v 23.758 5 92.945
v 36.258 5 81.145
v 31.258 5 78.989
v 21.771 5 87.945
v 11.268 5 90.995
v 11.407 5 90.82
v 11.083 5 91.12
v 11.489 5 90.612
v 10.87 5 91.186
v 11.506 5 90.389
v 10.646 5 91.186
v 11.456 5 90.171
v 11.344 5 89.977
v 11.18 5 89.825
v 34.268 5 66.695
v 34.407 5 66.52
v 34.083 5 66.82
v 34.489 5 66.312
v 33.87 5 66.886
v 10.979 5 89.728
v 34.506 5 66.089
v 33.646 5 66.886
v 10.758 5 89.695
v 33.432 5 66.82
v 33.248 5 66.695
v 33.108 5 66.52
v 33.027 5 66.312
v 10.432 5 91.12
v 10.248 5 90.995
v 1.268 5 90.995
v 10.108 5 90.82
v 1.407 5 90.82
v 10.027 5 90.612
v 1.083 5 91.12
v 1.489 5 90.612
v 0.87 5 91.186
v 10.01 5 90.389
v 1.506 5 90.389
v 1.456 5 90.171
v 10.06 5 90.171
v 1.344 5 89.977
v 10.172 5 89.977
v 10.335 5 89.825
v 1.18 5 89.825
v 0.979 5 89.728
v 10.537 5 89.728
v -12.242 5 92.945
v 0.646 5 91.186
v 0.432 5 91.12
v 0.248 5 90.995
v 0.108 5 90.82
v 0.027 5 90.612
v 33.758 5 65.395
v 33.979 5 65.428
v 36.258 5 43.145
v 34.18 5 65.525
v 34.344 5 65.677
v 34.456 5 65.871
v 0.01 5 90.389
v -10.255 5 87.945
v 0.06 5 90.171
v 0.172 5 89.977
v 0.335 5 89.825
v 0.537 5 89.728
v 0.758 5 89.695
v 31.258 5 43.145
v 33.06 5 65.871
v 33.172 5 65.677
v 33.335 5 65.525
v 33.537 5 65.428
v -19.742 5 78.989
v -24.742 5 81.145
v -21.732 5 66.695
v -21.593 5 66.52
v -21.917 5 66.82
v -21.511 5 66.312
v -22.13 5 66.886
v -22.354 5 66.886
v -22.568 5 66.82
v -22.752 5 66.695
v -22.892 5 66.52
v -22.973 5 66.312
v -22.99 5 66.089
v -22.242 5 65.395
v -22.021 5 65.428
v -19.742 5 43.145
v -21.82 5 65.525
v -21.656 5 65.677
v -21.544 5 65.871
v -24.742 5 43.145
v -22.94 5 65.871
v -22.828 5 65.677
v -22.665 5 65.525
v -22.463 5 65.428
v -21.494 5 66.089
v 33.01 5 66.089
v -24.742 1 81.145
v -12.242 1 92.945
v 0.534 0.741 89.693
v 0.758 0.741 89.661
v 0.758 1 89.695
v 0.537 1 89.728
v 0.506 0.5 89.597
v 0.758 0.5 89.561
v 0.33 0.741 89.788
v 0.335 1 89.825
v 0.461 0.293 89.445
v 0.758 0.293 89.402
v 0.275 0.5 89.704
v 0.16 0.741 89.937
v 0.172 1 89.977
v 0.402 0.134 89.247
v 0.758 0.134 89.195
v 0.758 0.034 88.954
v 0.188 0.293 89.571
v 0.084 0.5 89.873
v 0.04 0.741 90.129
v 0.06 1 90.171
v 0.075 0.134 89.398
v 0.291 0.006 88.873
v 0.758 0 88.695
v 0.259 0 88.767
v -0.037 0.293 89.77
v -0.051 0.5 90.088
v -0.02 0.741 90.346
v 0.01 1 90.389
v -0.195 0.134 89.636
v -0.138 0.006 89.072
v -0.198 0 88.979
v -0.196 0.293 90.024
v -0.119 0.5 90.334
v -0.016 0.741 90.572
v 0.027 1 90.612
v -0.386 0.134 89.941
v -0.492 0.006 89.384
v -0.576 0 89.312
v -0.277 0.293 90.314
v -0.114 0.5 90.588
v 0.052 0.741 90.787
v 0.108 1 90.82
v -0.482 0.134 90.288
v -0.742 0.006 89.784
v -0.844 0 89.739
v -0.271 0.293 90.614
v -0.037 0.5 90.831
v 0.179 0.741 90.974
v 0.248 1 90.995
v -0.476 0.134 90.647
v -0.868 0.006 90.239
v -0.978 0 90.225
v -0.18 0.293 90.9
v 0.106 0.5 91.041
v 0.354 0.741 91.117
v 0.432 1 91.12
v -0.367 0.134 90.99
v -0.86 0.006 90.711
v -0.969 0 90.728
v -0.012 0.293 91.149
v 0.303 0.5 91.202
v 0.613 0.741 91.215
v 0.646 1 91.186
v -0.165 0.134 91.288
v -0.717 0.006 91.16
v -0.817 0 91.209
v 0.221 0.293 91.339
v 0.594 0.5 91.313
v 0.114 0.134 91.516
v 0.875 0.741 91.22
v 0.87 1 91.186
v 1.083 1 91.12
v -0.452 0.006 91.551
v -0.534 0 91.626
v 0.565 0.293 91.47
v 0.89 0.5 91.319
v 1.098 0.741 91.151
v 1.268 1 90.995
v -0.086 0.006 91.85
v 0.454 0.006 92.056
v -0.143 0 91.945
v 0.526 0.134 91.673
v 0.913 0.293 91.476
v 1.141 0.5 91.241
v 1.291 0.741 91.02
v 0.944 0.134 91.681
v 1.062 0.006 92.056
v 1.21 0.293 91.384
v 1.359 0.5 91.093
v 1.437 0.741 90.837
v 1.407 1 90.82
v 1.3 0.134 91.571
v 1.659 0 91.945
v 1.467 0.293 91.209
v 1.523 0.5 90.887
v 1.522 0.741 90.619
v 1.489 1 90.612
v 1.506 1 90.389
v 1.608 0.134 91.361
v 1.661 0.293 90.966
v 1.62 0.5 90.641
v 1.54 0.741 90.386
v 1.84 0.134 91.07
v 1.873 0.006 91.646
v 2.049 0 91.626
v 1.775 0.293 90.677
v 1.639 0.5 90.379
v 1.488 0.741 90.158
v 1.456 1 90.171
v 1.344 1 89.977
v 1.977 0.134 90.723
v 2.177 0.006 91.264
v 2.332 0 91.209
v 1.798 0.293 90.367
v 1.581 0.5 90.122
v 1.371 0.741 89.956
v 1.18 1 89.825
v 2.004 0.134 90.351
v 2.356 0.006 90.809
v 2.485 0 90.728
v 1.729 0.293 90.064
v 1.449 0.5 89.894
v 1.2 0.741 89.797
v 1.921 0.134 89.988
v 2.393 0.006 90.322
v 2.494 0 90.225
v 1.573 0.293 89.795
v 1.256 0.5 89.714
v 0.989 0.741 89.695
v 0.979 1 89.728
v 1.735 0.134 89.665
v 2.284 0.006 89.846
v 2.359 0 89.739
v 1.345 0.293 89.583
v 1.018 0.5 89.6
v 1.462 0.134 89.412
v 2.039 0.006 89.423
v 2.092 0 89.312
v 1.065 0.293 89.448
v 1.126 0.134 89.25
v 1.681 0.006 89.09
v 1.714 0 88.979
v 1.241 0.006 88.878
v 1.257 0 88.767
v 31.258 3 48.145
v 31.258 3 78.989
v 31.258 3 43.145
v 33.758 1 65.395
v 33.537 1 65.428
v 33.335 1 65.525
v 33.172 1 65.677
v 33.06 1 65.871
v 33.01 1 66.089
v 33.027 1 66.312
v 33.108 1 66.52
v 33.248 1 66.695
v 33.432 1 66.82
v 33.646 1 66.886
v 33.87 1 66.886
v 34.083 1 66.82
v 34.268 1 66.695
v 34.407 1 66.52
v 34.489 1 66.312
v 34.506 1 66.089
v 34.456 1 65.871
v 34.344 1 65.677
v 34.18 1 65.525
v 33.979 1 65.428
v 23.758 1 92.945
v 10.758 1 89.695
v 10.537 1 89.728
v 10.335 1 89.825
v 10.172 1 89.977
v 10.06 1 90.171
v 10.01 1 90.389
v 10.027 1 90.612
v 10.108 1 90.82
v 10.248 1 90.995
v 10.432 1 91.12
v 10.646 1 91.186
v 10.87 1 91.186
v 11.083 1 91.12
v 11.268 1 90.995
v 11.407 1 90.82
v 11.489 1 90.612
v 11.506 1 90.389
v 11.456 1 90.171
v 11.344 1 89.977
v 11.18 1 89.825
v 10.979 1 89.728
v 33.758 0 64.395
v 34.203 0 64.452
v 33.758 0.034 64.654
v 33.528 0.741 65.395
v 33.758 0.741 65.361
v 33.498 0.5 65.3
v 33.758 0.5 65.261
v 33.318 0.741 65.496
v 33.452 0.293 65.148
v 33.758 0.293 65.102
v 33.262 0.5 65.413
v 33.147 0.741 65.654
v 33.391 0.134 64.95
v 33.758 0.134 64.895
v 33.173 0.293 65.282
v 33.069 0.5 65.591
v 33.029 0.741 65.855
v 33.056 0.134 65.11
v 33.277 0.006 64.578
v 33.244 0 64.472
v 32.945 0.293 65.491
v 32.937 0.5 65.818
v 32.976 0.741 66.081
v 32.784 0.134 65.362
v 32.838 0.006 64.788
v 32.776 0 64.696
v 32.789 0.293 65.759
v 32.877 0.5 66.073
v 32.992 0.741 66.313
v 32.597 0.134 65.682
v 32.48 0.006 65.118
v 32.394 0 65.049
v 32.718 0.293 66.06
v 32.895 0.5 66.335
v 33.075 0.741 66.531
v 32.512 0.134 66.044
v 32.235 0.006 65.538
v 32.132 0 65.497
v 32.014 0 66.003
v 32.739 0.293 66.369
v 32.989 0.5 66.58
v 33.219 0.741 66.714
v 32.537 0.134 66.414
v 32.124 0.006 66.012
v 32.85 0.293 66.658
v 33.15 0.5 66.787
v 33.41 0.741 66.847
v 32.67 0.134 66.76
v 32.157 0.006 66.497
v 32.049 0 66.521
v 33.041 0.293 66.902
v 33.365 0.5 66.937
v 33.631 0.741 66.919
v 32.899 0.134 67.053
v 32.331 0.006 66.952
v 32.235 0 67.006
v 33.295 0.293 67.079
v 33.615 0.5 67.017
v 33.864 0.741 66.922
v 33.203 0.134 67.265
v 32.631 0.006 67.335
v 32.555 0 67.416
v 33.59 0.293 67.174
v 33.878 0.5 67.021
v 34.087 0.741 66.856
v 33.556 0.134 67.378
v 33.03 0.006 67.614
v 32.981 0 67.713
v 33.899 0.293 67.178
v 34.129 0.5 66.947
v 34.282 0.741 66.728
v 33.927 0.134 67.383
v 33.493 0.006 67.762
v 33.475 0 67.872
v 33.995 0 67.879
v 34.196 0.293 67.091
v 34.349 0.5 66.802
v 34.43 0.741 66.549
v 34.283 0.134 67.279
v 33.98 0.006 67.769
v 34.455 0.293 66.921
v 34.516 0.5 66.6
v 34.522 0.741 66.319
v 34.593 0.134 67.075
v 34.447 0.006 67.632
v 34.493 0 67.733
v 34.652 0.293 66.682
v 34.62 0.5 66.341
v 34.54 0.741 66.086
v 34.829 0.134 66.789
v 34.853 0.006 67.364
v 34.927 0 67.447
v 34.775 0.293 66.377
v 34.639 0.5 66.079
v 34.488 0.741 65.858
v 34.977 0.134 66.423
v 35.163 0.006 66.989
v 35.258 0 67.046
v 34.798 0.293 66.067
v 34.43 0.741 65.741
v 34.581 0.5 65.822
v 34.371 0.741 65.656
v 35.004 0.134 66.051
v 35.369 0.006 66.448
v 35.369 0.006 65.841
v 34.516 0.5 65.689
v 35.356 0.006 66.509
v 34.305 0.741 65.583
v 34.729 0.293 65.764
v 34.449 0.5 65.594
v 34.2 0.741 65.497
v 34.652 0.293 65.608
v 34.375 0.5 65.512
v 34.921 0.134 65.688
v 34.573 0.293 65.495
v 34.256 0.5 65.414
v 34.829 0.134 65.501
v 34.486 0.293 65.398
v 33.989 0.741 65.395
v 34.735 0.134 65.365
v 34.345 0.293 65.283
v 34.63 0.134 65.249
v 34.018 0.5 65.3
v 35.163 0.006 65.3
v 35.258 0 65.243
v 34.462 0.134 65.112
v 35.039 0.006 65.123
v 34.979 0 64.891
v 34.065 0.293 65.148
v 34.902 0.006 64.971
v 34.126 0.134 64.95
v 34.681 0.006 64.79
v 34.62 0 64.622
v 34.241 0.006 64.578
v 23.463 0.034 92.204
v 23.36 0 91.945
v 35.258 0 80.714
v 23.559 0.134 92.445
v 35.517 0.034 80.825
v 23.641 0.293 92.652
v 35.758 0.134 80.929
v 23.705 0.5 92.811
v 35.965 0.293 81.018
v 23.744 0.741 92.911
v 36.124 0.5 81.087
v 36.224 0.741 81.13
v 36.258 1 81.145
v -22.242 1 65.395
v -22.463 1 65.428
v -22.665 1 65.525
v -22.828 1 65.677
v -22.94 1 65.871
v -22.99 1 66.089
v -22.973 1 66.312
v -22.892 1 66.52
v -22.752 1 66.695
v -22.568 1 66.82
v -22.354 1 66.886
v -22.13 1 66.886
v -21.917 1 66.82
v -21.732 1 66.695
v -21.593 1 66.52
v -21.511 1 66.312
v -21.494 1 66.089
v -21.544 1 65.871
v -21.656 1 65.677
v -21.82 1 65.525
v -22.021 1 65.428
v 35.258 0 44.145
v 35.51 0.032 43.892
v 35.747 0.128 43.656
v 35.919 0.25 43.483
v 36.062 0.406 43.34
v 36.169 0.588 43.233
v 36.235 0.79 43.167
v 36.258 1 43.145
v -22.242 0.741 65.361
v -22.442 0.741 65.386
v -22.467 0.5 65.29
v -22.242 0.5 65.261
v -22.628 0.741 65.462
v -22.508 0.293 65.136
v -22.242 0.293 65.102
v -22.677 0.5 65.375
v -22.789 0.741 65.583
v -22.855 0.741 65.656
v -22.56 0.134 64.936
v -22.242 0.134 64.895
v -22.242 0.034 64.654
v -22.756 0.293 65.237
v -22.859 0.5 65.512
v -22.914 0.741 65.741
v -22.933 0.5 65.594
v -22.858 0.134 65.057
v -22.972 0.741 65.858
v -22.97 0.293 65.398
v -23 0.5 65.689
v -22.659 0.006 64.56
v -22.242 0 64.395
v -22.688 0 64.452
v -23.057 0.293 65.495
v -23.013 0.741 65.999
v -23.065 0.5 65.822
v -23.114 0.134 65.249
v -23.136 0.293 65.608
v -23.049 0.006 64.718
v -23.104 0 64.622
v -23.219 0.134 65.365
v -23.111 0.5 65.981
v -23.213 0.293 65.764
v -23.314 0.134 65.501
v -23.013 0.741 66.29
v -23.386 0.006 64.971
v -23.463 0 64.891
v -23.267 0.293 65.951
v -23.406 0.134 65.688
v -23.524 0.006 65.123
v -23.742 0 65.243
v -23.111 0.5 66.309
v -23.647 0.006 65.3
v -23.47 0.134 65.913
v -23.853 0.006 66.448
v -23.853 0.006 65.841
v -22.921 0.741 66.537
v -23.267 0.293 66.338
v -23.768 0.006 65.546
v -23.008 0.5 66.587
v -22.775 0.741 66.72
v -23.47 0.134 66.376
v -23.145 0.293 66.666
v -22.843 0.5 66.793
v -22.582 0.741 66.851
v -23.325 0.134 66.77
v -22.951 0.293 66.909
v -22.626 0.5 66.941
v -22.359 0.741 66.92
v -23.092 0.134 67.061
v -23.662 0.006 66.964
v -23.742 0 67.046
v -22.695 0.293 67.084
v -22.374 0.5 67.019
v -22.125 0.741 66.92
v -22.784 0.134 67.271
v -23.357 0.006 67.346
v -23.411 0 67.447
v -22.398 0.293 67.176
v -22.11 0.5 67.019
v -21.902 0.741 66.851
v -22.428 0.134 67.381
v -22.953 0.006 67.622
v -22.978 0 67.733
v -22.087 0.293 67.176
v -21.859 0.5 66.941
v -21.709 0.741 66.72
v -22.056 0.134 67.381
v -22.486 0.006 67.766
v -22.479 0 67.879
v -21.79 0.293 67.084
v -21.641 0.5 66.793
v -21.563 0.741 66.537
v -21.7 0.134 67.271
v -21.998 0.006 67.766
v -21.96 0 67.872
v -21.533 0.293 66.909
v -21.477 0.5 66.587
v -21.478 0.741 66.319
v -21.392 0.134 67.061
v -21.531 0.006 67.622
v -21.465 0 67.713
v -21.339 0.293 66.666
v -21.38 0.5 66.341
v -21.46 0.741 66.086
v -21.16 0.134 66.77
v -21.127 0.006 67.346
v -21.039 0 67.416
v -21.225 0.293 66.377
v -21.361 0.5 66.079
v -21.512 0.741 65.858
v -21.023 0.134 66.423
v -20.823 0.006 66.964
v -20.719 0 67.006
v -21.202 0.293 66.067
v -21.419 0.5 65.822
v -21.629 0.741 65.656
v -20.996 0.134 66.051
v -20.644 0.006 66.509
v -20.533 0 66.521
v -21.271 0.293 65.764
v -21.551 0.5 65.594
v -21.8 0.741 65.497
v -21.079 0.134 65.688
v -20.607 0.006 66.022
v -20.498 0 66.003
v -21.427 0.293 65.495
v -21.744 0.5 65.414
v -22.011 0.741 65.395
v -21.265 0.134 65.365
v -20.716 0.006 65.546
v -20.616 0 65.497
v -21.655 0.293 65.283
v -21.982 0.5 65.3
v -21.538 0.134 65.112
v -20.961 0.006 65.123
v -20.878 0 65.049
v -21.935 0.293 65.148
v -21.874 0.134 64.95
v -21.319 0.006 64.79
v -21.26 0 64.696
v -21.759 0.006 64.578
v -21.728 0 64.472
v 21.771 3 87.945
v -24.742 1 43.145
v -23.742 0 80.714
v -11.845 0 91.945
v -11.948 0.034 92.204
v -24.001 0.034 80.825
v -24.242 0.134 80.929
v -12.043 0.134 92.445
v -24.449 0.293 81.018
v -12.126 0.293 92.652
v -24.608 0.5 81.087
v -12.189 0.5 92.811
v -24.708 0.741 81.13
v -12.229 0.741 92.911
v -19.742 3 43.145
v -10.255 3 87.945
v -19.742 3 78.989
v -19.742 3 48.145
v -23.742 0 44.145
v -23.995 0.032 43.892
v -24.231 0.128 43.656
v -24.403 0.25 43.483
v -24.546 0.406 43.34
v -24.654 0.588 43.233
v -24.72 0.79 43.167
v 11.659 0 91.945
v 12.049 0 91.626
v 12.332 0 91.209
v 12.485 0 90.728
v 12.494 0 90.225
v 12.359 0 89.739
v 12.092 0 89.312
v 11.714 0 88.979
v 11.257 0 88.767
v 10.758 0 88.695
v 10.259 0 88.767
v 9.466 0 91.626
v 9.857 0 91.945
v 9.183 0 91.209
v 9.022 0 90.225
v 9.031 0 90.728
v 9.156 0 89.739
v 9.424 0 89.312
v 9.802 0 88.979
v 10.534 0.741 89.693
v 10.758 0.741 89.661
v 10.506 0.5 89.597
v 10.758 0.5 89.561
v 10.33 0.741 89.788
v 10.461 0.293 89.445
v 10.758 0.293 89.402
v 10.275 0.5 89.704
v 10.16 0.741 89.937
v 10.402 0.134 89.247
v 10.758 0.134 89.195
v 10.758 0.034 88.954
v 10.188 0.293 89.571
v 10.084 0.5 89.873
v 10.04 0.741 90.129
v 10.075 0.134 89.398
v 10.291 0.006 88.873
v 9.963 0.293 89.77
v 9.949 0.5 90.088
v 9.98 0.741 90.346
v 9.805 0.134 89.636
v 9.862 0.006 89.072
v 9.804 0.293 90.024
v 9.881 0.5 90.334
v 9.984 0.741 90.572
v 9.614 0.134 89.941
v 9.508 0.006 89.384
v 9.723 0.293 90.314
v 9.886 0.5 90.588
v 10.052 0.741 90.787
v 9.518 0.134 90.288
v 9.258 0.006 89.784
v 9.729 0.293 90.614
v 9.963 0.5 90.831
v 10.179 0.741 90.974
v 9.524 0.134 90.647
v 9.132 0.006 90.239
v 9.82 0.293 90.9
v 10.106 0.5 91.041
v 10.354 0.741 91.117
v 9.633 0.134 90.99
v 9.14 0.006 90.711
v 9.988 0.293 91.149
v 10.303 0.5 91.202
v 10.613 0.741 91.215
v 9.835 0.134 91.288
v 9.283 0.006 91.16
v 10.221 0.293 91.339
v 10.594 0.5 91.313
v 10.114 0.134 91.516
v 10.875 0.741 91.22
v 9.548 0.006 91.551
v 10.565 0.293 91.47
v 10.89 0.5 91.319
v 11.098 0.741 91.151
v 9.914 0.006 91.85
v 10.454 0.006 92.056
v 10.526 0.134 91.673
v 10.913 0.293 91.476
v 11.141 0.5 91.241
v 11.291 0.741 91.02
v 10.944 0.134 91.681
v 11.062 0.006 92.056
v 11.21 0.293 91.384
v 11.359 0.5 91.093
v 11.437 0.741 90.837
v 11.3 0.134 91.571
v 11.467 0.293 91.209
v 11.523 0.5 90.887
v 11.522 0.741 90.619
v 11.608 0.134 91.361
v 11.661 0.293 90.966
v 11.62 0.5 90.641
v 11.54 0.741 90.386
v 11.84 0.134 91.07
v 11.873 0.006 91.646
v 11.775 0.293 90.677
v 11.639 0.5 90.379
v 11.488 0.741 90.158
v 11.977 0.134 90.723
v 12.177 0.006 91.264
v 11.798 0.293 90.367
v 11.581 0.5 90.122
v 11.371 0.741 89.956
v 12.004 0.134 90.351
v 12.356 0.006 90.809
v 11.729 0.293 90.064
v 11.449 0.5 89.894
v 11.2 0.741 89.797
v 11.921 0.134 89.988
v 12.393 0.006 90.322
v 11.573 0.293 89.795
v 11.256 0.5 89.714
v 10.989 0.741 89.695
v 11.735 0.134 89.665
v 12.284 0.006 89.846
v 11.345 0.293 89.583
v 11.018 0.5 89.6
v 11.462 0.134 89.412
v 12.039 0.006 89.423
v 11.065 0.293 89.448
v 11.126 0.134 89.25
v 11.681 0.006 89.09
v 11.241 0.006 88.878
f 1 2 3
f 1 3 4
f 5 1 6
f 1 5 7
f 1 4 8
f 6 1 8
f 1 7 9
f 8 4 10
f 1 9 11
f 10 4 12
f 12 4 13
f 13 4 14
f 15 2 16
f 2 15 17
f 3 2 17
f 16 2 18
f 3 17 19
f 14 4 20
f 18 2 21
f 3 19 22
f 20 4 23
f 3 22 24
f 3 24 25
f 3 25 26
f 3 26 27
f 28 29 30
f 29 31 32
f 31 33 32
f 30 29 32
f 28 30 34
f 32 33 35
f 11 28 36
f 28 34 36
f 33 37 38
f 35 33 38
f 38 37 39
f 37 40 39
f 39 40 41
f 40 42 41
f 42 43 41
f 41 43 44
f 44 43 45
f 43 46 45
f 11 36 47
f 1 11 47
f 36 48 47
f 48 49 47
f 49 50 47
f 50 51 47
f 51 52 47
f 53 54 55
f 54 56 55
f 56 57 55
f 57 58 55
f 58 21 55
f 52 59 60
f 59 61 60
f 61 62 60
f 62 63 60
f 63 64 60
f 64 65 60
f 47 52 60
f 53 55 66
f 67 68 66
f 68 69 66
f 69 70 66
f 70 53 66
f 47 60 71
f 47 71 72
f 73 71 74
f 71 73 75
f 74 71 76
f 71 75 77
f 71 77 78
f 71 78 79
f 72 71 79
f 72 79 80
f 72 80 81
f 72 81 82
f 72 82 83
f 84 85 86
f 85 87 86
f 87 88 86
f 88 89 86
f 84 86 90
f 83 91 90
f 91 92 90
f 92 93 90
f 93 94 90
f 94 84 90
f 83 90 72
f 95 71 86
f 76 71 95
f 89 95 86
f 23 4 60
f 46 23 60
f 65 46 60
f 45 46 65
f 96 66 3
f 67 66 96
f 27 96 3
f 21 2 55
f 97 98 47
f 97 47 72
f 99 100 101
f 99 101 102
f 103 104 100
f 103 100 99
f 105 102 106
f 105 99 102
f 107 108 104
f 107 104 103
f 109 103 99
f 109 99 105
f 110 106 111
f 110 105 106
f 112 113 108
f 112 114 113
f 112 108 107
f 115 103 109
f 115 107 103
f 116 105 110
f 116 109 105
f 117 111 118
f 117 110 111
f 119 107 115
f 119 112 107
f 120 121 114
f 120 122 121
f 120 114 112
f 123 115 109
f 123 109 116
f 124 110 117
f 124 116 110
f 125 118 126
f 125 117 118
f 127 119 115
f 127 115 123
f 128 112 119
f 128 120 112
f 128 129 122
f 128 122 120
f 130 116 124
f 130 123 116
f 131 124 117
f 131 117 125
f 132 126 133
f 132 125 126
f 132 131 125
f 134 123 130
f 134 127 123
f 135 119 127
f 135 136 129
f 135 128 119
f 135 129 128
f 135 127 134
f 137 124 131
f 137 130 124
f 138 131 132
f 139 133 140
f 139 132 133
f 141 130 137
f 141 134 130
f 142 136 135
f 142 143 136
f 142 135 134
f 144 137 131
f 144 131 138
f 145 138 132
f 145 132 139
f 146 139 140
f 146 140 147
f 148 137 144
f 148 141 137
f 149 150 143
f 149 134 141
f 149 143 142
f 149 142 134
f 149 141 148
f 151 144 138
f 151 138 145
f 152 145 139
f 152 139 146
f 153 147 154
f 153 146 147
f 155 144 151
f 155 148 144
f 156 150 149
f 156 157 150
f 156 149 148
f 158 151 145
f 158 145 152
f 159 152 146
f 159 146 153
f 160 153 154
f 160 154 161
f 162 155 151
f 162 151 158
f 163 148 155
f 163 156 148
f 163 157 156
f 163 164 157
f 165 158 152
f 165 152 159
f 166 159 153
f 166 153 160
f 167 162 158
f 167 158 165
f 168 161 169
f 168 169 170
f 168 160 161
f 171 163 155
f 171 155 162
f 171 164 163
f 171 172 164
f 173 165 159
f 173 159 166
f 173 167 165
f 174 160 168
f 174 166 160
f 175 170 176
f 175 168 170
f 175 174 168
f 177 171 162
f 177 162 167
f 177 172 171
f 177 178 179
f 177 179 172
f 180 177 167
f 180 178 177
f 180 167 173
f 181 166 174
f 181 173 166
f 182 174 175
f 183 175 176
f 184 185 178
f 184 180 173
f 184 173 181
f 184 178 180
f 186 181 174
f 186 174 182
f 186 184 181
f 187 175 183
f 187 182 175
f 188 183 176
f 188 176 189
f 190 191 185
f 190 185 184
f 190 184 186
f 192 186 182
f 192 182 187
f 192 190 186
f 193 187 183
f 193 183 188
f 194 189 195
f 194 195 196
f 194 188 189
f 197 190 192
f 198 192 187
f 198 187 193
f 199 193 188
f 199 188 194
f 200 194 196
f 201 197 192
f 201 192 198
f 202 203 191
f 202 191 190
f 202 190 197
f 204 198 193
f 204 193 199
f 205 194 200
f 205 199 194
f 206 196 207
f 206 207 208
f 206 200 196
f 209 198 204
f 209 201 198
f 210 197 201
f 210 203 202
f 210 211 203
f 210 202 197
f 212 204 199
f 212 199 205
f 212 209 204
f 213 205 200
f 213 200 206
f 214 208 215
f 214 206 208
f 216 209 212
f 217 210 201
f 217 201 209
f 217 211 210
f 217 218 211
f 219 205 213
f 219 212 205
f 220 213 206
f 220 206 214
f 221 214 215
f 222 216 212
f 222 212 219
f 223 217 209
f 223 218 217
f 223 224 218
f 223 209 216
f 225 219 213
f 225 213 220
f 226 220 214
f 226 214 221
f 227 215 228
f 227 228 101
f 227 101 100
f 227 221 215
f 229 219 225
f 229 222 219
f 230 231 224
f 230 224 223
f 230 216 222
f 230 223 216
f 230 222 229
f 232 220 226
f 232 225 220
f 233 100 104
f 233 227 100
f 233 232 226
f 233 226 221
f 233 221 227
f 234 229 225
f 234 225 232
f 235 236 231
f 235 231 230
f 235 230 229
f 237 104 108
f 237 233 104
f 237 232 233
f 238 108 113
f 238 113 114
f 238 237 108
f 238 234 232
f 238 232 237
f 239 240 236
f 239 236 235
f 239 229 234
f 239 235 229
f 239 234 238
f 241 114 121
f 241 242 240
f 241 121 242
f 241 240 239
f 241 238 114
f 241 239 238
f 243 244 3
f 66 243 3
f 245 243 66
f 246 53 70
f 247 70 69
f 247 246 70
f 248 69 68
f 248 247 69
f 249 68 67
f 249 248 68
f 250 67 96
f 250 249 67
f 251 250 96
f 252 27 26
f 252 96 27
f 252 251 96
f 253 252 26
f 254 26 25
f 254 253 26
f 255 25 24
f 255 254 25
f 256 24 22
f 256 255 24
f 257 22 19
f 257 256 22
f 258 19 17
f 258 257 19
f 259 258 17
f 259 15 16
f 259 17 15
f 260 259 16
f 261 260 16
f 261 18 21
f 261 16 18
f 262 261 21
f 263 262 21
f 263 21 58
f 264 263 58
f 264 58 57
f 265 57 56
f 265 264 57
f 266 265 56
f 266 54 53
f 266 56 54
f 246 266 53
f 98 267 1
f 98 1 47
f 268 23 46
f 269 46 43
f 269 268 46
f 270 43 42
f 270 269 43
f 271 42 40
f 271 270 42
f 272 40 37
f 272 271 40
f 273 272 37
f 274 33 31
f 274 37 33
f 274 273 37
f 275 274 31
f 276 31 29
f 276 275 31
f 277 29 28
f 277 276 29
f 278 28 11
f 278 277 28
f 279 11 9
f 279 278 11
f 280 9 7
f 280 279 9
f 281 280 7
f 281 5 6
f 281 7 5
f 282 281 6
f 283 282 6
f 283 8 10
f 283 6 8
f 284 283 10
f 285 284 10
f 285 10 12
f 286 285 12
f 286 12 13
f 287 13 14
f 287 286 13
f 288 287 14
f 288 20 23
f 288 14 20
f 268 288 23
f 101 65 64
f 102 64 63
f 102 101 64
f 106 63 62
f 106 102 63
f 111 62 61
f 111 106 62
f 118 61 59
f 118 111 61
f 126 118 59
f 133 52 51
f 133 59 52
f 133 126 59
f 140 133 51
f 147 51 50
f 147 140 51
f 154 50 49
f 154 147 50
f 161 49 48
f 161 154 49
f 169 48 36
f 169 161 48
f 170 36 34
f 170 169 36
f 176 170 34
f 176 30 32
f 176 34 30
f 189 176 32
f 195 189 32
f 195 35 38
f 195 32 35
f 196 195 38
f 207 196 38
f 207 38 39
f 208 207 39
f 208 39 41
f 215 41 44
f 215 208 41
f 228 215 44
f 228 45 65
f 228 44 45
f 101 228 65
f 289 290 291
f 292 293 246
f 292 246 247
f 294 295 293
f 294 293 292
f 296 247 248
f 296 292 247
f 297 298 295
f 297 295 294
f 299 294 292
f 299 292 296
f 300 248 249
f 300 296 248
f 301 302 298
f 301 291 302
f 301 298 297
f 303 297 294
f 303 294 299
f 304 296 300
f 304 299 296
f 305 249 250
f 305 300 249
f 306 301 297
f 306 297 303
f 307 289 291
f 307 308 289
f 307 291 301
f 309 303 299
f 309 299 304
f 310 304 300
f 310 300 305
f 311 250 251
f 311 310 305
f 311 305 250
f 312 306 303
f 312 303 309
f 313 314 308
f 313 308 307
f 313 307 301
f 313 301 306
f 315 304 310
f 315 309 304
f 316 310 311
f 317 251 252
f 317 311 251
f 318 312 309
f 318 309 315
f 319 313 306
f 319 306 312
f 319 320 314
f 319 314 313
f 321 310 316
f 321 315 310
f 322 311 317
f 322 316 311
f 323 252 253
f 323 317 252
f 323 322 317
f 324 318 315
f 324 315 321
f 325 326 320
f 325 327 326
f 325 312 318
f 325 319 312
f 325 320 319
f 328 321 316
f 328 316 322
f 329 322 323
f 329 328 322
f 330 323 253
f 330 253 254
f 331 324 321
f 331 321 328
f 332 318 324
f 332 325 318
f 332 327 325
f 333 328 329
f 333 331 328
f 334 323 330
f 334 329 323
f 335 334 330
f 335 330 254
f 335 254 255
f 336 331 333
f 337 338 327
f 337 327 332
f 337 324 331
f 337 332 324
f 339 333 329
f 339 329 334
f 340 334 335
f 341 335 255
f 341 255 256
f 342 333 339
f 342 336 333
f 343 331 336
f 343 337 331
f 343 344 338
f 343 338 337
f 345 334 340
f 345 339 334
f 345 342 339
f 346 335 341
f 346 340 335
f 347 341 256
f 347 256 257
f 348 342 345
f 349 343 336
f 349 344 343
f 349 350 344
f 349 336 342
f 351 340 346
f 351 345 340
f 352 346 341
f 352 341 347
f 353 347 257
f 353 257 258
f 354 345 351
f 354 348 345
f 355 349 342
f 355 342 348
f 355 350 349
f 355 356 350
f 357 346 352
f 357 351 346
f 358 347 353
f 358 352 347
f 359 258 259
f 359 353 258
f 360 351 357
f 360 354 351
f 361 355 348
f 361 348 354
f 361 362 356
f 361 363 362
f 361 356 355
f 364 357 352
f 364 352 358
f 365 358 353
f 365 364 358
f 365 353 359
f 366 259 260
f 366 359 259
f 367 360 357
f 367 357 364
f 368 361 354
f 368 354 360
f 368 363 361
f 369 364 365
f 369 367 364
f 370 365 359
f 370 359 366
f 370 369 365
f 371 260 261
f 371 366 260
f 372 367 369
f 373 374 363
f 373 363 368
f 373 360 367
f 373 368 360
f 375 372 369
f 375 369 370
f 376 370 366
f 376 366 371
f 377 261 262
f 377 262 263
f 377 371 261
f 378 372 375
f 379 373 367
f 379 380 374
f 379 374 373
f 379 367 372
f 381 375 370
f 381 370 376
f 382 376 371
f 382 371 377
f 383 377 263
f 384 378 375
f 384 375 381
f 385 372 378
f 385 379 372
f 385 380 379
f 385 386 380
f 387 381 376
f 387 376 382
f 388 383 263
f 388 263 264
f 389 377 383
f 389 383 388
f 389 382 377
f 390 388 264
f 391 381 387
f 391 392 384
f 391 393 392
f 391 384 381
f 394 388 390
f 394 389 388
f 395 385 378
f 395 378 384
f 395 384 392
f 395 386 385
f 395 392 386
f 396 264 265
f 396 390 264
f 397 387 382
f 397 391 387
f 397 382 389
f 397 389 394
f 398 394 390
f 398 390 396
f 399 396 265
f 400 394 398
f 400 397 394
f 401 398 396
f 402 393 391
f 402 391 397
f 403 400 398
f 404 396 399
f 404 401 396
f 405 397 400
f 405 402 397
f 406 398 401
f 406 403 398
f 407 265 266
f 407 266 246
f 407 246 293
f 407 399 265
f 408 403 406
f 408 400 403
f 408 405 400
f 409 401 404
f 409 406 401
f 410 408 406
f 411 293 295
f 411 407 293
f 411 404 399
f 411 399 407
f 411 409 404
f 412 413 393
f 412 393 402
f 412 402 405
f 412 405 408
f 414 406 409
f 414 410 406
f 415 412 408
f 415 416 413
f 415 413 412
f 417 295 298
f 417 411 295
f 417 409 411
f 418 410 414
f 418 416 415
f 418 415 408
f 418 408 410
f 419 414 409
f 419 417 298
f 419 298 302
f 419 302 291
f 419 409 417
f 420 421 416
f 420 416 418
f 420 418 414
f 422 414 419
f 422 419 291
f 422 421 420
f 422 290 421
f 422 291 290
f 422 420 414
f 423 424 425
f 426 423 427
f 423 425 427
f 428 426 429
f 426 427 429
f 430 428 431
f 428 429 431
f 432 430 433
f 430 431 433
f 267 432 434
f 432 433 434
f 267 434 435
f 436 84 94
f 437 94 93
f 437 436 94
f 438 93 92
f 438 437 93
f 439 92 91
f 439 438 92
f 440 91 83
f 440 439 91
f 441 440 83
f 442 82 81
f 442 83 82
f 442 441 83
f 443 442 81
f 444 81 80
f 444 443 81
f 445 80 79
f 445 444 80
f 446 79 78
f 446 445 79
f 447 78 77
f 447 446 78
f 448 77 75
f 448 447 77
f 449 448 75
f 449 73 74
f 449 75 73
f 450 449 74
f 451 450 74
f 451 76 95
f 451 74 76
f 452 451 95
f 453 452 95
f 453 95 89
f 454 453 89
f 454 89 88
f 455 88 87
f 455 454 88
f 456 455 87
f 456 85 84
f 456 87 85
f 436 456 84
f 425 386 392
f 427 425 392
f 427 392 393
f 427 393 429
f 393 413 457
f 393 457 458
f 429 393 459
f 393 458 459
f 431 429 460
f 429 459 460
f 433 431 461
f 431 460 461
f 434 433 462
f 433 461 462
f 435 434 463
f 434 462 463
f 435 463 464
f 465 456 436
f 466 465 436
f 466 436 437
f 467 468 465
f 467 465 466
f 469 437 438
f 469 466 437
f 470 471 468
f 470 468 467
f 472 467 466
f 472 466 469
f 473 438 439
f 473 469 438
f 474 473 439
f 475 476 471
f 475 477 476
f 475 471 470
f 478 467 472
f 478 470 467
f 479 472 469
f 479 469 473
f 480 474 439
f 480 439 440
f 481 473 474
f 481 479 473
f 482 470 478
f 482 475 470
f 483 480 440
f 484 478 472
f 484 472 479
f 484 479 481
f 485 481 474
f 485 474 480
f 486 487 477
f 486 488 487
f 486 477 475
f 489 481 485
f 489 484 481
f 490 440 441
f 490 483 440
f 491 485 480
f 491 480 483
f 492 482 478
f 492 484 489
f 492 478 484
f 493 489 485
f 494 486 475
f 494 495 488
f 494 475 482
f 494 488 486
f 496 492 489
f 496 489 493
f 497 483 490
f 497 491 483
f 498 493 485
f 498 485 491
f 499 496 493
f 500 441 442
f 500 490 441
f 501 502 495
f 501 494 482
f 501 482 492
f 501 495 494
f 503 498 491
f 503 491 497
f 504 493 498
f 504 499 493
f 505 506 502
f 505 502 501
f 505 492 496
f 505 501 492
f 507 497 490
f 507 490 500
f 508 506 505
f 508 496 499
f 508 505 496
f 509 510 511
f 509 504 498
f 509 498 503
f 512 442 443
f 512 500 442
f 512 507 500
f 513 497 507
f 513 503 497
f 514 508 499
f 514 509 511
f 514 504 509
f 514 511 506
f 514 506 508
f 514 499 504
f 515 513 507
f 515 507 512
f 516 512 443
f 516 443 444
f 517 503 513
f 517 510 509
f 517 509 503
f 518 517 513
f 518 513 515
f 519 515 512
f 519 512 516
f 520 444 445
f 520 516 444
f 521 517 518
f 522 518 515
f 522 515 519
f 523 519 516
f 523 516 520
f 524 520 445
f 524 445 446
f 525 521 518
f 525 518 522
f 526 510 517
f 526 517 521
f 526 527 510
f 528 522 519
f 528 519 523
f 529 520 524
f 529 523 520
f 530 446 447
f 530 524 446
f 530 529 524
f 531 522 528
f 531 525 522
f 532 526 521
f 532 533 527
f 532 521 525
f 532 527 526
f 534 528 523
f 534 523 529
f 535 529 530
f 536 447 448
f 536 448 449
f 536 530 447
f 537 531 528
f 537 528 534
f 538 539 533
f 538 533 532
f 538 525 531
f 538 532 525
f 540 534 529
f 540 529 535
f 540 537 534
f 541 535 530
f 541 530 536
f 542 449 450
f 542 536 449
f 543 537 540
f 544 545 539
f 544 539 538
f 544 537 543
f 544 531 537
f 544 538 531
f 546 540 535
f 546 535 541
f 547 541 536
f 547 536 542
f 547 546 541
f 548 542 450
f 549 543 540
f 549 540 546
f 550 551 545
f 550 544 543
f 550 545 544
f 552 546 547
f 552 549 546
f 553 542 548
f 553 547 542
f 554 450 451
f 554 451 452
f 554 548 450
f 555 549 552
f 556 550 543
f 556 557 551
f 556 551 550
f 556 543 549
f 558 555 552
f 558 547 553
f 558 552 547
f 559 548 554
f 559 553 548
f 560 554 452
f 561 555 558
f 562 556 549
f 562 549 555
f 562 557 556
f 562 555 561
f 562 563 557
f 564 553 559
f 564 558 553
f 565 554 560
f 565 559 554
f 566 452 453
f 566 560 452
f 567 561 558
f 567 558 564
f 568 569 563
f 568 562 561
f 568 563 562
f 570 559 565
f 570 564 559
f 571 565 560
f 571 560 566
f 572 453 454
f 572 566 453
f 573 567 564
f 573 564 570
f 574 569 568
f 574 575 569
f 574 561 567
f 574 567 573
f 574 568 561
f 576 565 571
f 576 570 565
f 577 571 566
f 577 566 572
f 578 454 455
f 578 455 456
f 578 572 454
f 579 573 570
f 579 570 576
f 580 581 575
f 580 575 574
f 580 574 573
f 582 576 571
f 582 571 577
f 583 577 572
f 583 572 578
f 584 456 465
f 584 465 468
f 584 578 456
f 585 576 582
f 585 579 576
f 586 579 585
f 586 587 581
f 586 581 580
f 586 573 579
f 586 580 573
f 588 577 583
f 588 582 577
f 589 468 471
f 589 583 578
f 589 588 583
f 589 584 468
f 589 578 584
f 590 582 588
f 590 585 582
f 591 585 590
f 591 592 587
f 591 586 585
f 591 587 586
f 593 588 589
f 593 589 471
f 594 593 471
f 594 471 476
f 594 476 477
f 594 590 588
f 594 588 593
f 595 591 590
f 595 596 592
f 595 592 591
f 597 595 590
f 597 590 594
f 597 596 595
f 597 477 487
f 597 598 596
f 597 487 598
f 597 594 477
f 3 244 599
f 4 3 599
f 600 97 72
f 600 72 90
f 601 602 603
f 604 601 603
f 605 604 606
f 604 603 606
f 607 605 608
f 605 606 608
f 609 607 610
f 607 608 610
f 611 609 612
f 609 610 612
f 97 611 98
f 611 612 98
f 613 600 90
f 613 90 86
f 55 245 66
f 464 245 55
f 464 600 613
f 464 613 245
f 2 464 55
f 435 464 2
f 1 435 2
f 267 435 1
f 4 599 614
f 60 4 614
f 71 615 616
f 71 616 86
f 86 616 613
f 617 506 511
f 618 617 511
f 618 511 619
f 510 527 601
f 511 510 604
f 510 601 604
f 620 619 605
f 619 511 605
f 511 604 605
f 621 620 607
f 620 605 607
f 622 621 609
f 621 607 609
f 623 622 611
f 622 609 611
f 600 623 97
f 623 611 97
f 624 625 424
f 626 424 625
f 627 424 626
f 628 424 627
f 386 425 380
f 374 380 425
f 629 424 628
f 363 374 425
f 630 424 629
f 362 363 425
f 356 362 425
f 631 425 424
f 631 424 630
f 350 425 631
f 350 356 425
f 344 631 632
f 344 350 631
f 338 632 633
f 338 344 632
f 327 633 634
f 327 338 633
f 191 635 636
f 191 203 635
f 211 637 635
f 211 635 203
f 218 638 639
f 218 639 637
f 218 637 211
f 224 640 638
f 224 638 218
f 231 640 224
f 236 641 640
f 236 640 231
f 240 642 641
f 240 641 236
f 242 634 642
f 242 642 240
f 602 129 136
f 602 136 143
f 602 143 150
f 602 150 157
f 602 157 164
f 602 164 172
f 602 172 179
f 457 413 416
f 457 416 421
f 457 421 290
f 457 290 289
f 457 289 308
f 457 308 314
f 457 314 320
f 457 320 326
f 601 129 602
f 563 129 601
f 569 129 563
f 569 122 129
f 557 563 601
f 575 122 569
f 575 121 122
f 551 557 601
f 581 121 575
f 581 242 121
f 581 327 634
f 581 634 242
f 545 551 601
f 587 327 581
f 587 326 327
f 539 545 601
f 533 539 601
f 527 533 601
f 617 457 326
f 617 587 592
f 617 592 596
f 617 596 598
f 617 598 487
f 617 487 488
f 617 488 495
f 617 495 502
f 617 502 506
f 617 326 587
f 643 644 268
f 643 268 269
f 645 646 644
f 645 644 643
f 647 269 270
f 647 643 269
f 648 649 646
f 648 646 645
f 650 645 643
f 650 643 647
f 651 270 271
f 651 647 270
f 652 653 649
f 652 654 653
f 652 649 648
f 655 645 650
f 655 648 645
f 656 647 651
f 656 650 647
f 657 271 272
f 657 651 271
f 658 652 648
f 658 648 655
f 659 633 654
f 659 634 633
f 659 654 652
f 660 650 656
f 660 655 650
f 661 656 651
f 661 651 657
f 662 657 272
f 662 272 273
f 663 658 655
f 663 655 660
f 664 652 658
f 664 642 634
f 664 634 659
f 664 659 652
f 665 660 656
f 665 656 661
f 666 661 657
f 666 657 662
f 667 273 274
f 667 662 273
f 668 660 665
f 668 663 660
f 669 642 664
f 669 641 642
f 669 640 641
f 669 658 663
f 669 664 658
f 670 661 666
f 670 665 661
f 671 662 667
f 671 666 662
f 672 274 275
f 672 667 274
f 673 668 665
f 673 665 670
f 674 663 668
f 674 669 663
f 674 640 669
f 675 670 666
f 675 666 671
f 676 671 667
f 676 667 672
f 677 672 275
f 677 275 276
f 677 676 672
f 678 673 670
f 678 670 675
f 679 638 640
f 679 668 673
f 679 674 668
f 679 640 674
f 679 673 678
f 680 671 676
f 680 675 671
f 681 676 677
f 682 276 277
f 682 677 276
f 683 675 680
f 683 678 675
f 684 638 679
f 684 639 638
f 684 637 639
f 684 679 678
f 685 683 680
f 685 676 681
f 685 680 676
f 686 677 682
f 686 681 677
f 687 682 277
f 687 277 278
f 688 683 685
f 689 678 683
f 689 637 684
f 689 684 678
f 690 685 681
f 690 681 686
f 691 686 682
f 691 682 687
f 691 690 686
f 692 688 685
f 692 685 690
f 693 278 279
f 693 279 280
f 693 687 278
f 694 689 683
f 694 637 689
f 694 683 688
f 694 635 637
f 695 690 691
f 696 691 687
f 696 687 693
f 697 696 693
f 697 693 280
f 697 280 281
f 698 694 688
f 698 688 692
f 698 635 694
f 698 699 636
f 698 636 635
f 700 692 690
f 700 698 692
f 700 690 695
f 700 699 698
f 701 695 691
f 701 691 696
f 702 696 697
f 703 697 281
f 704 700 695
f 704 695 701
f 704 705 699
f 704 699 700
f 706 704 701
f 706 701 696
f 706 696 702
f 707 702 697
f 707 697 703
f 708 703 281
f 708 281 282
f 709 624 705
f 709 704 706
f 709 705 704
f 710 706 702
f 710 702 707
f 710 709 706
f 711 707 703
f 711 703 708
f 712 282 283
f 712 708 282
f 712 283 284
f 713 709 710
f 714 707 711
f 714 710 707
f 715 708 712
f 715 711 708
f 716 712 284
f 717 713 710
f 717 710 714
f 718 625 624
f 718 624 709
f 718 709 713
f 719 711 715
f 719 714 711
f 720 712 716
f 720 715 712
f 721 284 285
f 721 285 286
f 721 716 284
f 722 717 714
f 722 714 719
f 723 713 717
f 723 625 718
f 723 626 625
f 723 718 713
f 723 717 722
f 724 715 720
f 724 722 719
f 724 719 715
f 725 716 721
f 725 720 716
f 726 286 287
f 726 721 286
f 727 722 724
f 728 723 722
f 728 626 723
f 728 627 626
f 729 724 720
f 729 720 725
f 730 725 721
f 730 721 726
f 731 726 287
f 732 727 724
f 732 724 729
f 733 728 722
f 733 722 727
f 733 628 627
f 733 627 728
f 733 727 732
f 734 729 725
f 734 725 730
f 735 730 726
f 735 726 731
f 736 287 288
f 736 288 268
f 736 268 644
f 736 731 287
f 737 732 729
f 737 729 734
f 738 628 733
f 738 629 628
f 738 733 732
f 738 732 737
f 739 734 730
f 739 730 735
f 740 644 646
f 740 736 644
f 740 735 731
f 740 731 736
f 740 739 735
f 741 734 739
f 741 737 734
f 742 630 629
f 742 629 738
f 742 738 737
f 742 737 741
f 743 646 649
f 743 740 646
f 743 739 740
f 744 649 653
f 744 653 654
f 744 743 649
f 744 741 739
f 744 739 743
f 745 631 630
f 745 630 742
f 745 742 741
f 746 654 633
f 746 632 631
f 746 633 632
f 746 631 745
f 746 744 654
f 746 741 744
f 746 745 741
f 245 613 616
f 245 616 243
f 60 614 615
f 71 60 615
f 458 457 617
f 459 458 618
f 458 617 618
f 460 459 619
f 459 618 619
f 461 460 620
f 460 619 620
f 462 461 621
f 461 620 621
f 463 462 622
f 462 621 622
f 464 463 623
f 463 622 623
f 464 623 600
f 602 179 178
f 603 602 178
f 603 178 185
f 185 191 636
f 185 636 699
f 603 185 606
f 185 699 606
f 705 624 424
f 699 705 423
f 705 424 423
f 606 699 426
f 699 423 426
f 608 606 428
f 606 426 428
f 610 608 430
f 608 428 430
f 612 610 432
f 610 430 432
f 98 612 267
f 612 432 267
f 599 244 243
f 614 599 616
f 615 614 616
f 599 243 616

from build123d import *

# Parameters (mm, degrees)
DODANIE_WYCI_GNI_CIE1_DEPTH       = 3
WYCI_GNI_CIE_CIENKA_CIANKA2_DEPTH = 2
WYTNIJ_WYCI_GNI_CIE1_DEPTH        = 27
WYTNIJ_WYCI_GNI_CIE1_DEPTH_BACK   = 40
SZKIC3_R                          = 0.75
ZAOKR_GLENIE2_R                   = 1
WYTNIJ_WYCI_GNI_CIE2_DEPTH        = 100.81161788
WYTNIJ_WYCI_GNI_CIE2_DEPTH_BACK   = 0.0001
SZKIC4_W                          = 51
SZKIC4_H                          = 5


with BuildPart() as part:
    # Szkic1 → Dodanie-wyciągnięcie1 (new body)
    with BuildSketch(Plane(origin=(0, 0, 0), x_dir=(1, 0, 0), z_dir=(0, 1, 0))):
        Polygon((-24.742105263, -43.144736842), (36.257894737, -43.144736842), (36.257894737, -81.144736842), (23.757894737, -92.944736842), (-12.242105263, -92.944736842), (-24.742105263, -81.144736842), align=None)
    extrude(amount=DODANIE_WYCI_GNI_CIE1_DEPTH)

    # Szkic2 → Wyciągnięcie-cienka ścianka2 (add)
    with BuildSketch(Plane(origin=(0, 3, 0), x_dir=(1, 0, 0), z_dir=(0, 1, 0))):
        Polygon((23.757894737, -92.944736842), (-12.242105263, -92.944736842), (-24.742105263, -81.144736842), (-24.742105263, -43.144736842), (36.257894737, -43.144736842), (36.257894737, -81.144736842), align=None)
        Polygon((21.770681783, -87.944736842), (-10.25489231, -87.944736842), (-19.742105263, -78.988807814), (-19.742105263, -48.144736842), (31.257894737, -48.144736842), (31.257894737, -78.988807814), align=None, mode=Mode.SUBTRACT)
    extrude(amount=WYCI_GNI_CIE_CIENKA_CIANKA2_DEPTH)

    # Szkic3 → Wytnij-wyciągnięcie1 (cut, two sides: drawn at the far end of the back side and taken through both)
    with BuildSketch(Plane(origin=(0, 5, 0), x_dir=(1, 0, 0), z_dir=(0, 1, 0)).offset(-WYTNIJ_WYCI_GNI_CIE1_DEPTH_BACK)):
        with Locations(Location((0.757894737, -90.444736842, 0), (0, 0, 90))):
            Circle(SZKIC3_R)
        with Locations(Location((10.757894737, -90.444736842, 0), (0, 0, 90))):
            Circle(SZKIC3_R)
        with Locations(Location((-22.242105263, -66.144736842, 0), (0, 0, 90))):
            Circle(SZKIC3_R)
        with Locations(Location((33.757894737, -66.144736842, 0), (0, 0, 90))):
            Circle(SZKIC3_R)
    extrude(amount=WYTNIJ_WYCI_GNI_CIE1_DEPTH + WYTNIJ_WYCI_GNI_CIE1_DEPTH_BACK, mode=Mode.SUBTRACT)

    # Zaokrąglenie2
    # the kernel refuses this fillet: 1 mm, written as the material it takes off along each edge
    with BuildSketch(Plane(origin=(33.757894737, 0, 66.144736842), x_dir=(0, 0, -1), z_dir=(1, 0, 0))) as zaokr_glenie2_piece_1:
        with BuildLine():
            CenterArc((0.75 + ZAOKR_GLENIE2_R, ZAOKR_GLENIE2_R), ZAOKR_GLENIE2_R, 180, 90)
            Line((0.75, ZAOKR_GLENIE2_R), (0.75, 0))
            Line((0.75, 0), (0.75 + ZAOKR_GLENIE2_R, 0))
        make_face()
    revolve(axis=Axis((33.757894737, 0, 66.144736842), (0, 1, 0)), mode=Mode.SUBTRACT)
    with BuildSketch(Plane(origin=(-22.242105263, 0, 66.144736842), x_dir=(0, 0, -1), z_dir=(1, 0, 0))) as zaokr_glenie2_piece_2:
        with BuildLine():
            CenterArc((0.75 + ZAOKR_GLENIE2_R, ZAOKR_GLENIE2_R), ZAOKR_GLENIE2_R, 180, 90)
            Line((0.75, ZAOKR_GLENIE2_R), (0.75, 0))
            Line((0.75, 0), (0.75 + ZAOKR_GLENIE2_R, 0))
        make_face()
    revolve(axis=Axis((-22.242105263, 0, 66.144736842), (0, 1, 0)), mode=Mode.SUBTRACT)
    with BuildSketch(Plane(origin=(-27.242105263, 0, 43.144736842), x_dir=(0, 1, 0), z_dir=(1, 0, 0))) as zaokr_glenie2_piece_3:
        with BuildLine():
            CenterArc((ZAOKR_GLENIE2_R, ZAOKR_GLENIE2_R), ZAOKR_GLENIE2_R, 180, 90)
            Line((0, ZAOKR_GLENIE2_R), (0, 0))
            Line((0, 0), (ZAOKR_GLENIE2_R, 0))
        make_face()
    extrude(amount=66, mode=Mode.SUBTRACT)
    with BuildSketch(Plane(origin=(10.757894737, 0, 90.444736842), x_dir=(0, 0, -1), z_dir=(1, 0, 0))) as zaokr_glenie2_piece_4:
        with BuildLine():
            CenterArc((0.75 + ZAOKR_GLENIE2_R, ZAOKR_GLENIE2_R), ZAOKR_GLENIE2_R, 180, 90)
            Line((0.75, ZAOKR_GLENIE2_R), (0.75, 0))
            Line((0.75, 0), (0.75 + ZAOKR_GLENIE2_R, 0))
        make_face()
    revolve(axis=Axis((10.757894737, 0, 90.444736842), (0, 1, 0)), mode=Mode.SUBTRACT)
    with BuildSketch(Plane(origin=(36.257894737, 0, 40.644736842), x_dir=(0, 1, 0), z_dir=(0, 0, 1)), Plane(origin=(-24.742105263, 0, 83.644736842), x_dir=(0, 1, 0), z_dir=(0, 0, -1))) as zaokr_glenie2_piece_5:
        with BuildLine():
            CenterArc((ZAOKR_GLENIE2_R, ZAOKR_GLENIE2_R), ZAOKR_GLENIE2_R, 180, 90)
            Line((0, ZAOKR_GLENIE2_R), (0, 0))
            Line((0, 0), (ZAOKR_GLENIE2_R, 0))
        make_face()
    extrude(amount=43, mode=Mode.SUBTRACT)
    with BuildSketch(Plane(origin=(0.757894737, 0, 90.444736842), x_dir=(0, 0, -1), z_dir=(1, 0, 0))) as zaokr_glenie2_piece_6:
        with BuildLine():
            CenterArc((0.75 + ZAOKR_GLENIE2_R, ZAOKR_GLENIE2_R), ZAOKR_GLENIE2_R, 180, 90)
            Line((0.75, ZAOKR_GLENIE2_R), (0.75, 0))
            Line((0.75, 0), (0.75 + ZAOKR_GLENIE2_R, 0))
        make_face()
    revolve(axis=Axis((0.757894737, 0, 90.444736842), (0, 1, 0)), mode=Mode.SUBTRACT)
    with BuildSketch(Plane(origin=(38.075830895, 0, 79.428605109), x_dir=(-0.6864526932555783, 0, -0.7271744631944682), z_dir=(-0.7271744631944682, 0, 0.6864526932555782)), Plane(origin=(-10.424169105, 0, 94.660868575), x_dir=(0.686452693255578, 0, -0.7271744631944684), z_dir=(-0.7271744631944684, 0, -0.686452693255578))) as zaokr_glenie2_piece_7:
        with BuildLine():
            CenterArc((ZAOKR_GLENIE2_R, -ZAOKR_GLENIE2_R), ZAOKR_GLENIE2_R, 90, 90)
            Line((0, -ZAOKR_GLENIE2_R), (0, 0))
            Line((0, 0), (ZAOKR_GLENIE2_R, 0))
        make_face()
    extrude(amount=22.18982257, mode=Mode.SUBTRACT)
    with BuildSketch(Plane(origin=(26.257894737, 0, 92.944736842), x_dir=(0, 0, -1), z_dir=(-1, 0, 0))) as zaokr_glenie2_piece_8:
        with BuildLine():
            CenterArc((ZAOKR_GLENIE2_R, -ZAOKR_GLENIE2_R), ZAOKR_GLENIE2_R, 90, 90)
            Line((0, -ZAOKR_GLENIE2_R), (0, 0))
            Line((0, 0), (ZAOKR_GLENIE2_R, 0))
        make_face()
    extrude(amount=41, mode=Mode.SUBTRACT)

    # Szkic4 → Wytnij-wyciągnięcie2 (cut, two sides: drawn at the far end of the back side and taken through both)
    with BuildSketch(Plane(origin=(0, 3, 0), x_dir=(1, 0, 0), z_dir=(0, 1, 0)).offset(-WYTNIJ_WYCI_GNI_CIE2_DEPTH_BACK)):
        with Locations((5.757894737, -45.644736842)):
            Rectangle(SZKIC4_W, SZKIC4_H)
    extrude(amount=WYTNIJ_WYCI_GNI_CIE2_DEPTH + WYTNIJ_WYCI_GNI_CIE2_DEPTH_BACK, mode=Mode.SUBTRACT)


solid = part.part
